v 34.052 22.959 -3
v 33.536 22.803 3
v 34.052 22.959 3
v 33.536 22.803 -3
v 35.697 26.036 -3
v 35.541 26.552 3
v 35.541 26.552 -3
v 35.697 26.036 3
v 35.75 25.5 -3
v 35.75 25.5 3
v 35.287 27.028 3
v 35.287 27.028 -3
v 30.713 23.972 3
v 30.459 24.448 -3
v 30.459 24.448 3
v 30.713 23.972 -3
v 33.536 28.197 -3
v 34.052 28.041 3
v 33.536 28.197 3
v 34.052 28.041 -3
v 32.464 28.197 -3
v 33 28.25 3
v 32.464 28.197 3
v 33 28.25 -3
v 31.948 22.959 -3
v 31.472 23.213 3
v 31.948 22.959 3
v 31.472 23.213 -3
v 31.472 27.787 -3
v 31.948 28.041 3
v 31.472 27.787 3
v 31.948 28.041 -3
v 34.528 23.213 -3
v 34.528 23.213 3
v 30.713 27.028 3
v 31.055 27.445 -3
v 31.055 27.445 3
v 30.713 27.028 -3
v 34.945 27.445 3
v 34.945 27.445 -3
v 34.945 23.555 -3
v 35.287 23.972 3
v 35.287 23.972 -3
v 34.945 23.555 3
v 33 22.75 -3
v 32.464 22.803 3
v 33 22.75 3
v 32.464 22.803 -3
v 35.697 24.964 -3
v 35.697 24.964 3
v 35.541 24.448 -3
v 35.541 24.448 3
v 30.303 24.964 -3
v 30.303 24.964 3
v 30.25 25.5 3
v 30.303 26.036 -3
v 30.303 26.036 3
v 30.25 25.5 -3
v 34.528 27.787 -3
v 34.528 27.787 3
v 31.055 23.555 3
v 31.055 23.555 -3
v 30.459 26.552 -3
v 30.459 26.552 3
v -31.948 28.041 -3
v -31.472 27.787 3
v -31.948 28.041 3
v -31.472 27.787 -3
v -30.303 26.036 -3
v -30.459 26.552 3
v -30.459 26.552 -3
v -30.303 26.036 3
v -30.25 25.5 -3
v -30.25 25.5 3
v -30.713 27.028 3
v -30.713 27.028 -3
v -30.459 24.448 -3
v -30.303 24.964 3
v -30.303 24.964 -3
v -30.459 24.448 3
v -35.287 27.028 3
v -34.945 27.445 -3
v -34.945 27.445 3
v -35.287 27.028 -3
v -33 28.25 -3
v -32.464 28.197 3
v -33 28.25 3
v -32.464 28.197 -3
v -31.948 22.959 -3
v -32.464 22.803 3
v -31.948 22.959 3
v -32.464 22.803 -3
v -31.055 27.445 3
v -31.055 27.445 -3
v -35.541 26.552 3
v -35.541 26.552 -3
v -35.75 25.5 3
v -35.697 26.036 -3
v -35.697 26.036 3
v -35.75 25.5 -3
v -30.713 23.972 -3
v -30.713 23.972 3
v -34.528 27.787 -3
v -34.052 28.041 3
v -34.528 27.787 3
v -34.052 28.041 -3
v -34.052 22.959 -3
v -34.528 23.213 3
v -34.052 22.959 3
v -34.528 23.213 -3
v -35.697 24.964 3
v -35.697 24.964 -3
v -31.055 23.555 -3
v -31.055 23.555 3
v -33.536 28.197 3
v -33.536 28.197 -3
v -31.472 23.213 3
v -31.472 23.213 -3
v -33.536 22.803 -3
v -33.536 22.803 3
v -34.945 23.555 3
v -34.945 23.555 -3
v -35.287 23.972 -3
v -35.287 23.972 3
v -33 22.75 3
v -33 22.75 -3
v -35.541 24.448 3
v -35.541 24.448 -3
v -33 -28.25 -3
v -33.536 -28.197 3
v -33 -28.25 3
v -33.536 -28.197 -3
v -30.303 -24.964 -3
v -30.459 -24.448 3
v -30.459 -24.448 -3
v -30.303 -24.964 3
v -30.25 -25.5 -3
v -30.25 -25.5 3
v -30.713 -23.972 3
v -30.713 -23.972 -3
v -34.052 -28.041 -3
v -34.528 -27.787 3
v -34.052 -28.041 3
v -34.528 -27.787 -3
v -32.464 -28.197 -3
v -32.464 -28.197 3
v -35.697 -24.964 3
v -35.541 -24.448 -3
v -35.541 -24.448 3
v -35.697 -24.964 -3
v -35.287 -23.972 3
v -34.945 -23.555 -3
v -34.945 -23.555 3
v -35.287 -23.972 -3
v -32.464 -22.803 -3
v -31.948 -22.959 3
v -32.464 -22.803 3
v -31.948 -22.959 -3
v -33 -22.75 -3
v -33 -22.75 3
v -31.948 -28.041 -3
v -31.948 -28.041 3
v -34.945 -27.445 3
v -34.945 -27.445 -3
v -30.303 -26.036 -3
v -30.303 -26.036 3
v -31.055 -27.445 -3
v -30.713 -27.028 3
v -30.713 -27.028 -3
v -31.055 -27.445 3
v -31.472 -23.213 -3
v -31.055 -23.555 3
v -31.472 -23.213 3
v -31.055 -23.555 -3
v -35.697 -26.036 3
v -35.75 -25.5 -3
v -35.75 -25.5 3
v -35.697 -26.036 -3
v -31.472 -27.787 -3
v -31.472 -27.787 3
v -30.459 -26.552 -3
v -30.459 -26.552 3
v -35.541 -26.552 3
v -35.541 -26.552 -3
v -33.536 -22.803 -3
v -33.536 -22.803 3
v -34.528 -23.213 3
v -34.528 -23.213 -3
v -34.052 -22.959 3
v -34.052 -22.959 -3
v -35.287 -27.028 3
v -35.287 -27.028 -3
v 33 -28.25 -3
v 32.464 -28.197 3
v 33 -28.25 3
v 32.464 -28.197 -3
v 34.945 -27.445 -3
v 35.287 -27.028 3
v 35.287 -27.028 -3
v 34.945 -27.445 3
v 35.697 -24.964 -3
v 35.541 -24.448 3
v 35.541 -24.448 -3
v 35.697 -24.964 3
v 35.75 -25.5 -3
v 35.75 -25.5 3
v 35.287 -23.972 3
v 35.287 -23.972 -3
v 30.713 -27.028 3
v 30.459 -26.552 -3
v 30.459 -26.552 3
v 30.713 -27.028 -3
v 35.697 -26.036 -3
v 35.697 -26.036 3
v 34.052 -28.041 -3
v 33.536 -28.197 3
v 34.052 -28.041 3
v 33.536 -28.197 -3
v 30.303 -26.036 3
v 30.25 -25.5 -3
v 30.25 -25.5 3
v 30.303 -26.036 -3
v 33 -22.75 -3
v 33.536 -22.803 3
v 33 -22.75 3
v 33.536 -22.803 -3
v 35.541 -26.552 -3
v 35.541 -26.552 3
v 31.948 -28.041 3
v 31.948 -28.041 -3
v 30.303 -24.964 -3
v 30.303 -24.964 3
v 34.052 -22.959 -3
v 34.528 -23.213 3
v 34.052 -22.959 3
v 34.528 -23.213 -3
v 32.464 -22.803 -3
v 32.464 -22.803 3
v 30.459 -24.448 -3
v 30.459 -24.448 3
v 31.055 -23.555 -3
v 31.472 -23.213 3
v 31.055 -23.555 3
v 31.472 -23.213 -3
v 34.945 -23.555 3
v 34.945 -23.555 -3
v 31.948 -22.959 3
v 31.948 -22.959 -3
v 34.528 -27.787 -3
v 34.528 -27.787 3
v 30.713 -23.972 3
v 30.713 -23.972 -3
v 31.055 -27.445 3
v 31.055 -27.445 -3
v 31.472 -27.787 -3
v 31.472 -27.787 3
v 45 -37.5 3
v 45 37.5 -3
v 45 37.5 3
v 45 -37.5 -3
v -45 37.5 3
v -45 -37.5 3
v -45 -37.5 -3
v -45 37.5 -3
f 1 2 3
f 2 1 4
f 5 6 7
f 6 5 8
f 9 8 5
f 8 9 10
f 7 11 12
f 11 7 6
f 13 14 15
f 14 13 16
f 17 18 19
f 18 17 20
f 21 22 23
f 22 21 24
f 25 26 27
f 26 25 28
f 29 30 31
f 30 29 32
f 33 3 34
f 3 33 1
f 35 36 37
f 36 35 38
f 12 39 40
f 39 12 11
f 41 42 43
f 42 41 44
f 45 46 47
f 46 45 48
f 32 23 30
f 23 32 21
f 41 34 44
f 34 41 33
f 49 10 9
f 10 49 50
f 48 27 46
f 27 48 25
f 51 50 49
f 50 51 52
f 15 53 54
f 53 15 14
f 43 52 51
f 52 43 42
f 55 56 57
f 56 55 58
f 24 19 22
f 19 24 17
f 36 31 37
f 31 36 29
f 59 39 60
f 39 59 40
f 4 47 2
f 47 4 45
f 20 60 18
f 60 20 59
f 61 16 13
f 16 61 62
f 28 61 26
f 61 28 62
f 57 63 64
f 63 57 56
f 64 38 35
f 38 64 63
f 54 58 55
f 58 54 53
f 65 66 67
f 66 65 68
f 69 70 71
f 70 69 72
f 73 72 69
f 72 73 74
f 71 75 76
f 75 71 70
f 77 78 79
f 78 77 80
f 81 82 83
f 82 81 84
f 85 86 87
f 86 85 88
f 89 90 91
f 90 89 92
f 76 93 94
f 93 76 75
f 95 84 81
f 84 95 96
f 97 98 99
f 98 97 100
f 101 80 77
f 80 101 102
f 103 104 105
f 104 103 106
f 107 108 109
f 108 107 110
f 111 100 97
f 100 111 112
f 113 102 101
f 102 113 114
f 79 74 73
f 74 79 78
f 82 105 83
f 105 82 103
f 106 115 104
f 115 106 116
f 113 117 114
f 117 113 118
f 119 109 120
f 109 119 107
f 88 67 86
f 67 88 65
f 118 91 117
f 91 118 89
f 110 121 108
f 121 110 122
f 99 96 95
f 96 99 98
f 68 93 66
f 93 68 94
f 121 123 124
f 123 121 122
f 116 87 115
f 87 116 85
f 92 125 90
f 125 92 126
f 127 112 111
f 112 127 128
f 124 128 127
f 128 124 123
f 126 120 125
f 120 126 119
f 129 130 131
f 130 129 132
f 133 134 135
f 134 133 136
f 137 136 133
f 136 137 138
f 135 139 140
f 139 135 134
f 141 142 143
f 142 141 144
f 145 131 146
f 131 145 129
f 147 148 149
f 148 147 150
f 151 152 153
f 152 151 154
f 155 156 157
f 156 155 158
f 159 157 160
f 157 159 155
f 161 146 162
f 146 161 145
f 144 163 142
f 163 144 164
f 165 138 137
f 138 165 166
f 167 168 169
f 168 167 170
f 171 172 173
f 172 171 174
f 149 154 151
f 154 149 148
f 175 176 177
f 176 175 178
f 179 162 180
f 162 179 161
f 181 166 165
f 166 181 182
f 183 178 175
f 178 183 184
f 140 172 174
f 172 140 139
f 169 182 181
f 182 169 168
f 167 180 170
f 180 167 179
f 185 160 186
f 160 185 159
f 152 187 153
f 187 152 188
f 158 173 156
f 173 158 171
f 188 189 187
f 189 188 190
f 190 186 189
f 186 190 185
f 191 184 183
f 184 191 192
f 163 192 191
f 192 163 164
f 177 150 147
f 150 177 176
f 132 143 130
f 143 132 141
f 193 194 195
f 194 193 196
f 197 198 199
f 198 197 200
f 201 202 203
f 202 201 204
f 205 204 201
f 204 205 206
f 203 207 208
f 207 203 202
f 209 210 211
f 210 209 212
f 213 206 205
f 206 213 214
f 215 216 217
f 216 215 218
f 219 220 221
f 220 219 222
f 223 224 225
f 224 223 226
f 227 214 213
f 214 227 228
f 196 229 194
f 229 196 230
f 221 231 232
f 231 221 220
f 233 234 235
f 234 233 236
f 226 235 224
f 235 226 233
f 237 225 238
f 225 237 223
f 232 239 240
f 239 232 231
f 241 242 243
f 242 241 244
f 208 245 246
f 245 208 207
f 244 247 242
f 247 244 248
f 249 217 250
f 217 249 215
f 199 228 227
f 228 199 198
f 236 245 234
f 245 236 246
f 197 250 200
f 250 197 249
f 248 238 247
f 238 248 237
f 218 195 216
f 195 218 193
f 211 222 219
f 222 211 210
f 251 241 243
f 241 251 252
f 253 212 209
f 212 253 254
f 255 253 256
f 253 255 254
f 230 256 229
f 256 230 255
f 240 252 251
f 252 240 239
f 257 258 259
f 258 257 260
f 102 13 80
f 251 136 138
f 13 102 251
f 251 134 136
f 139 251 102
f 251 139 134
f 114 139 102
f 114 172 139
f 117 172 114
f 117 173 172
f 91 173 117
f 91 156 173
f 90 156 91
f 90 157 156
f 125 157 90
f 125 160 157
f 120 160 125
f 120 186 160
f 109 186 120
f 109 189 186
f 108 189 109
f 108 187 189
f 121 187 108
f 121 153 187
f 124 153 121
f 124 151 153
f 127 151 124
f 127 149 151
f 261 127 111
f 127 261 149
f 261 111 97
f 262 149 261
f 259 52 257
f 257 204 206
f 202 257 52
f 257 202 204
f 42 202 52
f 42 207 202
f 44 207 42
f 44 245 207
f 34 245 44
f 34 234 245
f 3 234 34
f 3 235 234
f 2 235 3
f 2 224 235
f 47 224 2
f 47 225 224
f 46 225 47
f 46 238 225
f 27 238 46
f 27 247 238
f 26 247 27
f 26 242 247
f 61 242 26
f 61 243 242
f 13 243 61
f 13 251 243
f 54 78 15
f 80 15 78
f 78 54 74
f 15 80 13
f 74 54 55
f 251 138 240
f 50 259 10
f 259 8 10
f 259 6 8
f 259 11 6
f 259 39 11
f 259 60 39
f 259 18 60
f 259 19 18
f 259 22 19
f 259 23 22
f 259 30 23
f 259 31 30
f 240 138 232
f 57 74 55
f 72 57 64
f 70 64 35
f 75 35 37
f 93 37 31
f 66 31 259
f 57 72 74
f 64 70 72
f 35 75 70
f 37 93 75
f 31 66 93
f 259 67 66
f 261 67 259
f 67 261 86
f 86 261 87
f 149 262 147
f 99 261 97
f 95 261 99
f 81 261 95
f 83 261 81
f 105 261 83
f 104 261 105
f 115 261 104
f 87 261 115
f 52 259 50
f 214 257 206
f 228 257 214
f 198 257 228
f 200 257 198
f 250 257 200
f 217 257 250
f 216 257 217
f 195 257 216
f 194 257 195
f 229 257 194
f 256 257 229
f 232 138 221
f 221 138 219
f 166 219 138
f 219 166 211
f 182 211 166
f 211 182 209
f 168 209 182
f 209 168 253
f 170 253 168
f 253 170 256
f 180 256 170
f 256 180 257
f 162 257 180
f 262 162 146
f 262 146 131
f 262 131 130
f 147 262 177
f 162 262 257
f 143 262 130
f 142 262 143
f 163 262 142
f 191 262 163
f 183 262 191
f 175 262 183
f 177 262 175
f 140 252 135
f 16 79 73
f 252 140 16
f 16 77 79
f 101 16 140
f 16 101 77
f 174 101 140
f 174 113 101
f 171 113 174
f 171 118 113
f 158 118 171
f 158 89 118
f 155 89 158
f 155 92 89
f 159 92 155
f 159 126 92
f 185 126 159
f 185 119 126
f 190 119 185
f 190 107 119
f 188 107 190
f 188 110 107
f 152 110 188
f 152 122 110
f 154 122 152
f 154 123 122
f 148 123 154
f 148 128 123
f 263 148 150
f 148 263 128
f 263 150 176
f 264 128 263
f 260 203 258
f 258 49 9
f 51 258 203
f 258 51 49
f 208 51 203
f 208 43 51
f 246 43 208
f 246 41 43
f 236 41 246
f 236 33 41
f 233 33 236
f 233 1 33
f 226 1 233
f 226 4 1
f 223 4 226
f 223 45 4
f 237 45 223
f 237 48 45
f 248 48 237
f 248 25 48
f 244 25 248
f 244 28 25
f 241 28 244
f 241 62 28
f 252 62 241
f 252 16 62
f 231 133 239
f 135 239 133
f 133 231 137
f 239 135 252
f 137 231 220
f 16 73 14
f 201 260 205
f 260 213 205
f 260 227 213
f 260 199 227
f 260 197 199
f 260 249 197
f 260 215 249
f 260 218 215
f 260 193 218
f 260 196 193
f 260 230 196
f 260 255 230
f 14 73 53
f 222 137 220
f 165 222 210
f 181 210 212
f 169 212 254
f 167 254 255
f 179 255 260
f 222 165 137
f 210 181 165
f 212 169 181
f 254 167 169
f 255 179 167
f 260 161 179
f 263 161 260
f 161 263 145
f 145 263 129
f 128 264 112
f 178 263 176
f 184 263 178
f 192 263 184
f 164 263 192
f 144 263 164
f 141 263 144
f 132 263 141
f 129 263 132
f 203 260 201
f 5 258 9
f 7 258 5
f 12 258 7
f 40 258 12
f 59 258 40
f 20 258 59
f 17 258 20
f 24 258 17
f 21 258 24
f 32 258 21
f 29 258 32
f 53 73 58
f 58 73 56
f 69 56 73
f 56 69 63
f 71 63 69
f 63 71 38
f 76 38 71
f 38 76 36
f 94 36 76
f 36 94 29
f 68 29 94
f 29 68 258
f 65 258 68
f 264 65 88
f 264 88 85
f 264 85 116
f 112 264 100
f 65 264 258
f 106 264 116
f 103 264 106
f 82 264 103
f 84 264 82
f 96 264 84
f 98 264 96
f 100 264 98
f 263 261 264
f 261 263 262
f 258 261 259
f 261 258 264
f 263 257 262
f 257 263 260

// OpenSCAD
$fn = 32;

// ----------------------------------------------------------------------
// Corner plate 90 x 75 x 6
// 4 holes, centres taken from the edge offset
// ----------------------------------------------------------------------

// --- parameters (mm) ---
plate = [90, 75, 6];  // overall size (x, y, z)
holes = 4;            // number of holes the drawing asks for
hole_d = 5.5;         // hole diameter
edge = 12;            // hole centre offset from the plate edge

// --- derived feature positions (mm) ---
corner_x = plate[0] / 2 - edge;  // = 33   corner hole X
corner_y = plate[1] / 2 - edge;  // = 25.5   corner hole Y
feature_centers = [
  [corner_x, corner_y],
  [-corner_x, corner_y],
  [-corner_x, -corner_y],
  [corner_x, -corner_y]
];   // hole centres the loop below drills

// plate outline, every hole drilled through with the same cutters
difference() {
  cube(plate, center = true);
  for (centre = feature_centers)
    translate([centre[0], centre[1], 0])
      cylinder(d = hole_d, h = plate[2] + 2, center = true);
}
